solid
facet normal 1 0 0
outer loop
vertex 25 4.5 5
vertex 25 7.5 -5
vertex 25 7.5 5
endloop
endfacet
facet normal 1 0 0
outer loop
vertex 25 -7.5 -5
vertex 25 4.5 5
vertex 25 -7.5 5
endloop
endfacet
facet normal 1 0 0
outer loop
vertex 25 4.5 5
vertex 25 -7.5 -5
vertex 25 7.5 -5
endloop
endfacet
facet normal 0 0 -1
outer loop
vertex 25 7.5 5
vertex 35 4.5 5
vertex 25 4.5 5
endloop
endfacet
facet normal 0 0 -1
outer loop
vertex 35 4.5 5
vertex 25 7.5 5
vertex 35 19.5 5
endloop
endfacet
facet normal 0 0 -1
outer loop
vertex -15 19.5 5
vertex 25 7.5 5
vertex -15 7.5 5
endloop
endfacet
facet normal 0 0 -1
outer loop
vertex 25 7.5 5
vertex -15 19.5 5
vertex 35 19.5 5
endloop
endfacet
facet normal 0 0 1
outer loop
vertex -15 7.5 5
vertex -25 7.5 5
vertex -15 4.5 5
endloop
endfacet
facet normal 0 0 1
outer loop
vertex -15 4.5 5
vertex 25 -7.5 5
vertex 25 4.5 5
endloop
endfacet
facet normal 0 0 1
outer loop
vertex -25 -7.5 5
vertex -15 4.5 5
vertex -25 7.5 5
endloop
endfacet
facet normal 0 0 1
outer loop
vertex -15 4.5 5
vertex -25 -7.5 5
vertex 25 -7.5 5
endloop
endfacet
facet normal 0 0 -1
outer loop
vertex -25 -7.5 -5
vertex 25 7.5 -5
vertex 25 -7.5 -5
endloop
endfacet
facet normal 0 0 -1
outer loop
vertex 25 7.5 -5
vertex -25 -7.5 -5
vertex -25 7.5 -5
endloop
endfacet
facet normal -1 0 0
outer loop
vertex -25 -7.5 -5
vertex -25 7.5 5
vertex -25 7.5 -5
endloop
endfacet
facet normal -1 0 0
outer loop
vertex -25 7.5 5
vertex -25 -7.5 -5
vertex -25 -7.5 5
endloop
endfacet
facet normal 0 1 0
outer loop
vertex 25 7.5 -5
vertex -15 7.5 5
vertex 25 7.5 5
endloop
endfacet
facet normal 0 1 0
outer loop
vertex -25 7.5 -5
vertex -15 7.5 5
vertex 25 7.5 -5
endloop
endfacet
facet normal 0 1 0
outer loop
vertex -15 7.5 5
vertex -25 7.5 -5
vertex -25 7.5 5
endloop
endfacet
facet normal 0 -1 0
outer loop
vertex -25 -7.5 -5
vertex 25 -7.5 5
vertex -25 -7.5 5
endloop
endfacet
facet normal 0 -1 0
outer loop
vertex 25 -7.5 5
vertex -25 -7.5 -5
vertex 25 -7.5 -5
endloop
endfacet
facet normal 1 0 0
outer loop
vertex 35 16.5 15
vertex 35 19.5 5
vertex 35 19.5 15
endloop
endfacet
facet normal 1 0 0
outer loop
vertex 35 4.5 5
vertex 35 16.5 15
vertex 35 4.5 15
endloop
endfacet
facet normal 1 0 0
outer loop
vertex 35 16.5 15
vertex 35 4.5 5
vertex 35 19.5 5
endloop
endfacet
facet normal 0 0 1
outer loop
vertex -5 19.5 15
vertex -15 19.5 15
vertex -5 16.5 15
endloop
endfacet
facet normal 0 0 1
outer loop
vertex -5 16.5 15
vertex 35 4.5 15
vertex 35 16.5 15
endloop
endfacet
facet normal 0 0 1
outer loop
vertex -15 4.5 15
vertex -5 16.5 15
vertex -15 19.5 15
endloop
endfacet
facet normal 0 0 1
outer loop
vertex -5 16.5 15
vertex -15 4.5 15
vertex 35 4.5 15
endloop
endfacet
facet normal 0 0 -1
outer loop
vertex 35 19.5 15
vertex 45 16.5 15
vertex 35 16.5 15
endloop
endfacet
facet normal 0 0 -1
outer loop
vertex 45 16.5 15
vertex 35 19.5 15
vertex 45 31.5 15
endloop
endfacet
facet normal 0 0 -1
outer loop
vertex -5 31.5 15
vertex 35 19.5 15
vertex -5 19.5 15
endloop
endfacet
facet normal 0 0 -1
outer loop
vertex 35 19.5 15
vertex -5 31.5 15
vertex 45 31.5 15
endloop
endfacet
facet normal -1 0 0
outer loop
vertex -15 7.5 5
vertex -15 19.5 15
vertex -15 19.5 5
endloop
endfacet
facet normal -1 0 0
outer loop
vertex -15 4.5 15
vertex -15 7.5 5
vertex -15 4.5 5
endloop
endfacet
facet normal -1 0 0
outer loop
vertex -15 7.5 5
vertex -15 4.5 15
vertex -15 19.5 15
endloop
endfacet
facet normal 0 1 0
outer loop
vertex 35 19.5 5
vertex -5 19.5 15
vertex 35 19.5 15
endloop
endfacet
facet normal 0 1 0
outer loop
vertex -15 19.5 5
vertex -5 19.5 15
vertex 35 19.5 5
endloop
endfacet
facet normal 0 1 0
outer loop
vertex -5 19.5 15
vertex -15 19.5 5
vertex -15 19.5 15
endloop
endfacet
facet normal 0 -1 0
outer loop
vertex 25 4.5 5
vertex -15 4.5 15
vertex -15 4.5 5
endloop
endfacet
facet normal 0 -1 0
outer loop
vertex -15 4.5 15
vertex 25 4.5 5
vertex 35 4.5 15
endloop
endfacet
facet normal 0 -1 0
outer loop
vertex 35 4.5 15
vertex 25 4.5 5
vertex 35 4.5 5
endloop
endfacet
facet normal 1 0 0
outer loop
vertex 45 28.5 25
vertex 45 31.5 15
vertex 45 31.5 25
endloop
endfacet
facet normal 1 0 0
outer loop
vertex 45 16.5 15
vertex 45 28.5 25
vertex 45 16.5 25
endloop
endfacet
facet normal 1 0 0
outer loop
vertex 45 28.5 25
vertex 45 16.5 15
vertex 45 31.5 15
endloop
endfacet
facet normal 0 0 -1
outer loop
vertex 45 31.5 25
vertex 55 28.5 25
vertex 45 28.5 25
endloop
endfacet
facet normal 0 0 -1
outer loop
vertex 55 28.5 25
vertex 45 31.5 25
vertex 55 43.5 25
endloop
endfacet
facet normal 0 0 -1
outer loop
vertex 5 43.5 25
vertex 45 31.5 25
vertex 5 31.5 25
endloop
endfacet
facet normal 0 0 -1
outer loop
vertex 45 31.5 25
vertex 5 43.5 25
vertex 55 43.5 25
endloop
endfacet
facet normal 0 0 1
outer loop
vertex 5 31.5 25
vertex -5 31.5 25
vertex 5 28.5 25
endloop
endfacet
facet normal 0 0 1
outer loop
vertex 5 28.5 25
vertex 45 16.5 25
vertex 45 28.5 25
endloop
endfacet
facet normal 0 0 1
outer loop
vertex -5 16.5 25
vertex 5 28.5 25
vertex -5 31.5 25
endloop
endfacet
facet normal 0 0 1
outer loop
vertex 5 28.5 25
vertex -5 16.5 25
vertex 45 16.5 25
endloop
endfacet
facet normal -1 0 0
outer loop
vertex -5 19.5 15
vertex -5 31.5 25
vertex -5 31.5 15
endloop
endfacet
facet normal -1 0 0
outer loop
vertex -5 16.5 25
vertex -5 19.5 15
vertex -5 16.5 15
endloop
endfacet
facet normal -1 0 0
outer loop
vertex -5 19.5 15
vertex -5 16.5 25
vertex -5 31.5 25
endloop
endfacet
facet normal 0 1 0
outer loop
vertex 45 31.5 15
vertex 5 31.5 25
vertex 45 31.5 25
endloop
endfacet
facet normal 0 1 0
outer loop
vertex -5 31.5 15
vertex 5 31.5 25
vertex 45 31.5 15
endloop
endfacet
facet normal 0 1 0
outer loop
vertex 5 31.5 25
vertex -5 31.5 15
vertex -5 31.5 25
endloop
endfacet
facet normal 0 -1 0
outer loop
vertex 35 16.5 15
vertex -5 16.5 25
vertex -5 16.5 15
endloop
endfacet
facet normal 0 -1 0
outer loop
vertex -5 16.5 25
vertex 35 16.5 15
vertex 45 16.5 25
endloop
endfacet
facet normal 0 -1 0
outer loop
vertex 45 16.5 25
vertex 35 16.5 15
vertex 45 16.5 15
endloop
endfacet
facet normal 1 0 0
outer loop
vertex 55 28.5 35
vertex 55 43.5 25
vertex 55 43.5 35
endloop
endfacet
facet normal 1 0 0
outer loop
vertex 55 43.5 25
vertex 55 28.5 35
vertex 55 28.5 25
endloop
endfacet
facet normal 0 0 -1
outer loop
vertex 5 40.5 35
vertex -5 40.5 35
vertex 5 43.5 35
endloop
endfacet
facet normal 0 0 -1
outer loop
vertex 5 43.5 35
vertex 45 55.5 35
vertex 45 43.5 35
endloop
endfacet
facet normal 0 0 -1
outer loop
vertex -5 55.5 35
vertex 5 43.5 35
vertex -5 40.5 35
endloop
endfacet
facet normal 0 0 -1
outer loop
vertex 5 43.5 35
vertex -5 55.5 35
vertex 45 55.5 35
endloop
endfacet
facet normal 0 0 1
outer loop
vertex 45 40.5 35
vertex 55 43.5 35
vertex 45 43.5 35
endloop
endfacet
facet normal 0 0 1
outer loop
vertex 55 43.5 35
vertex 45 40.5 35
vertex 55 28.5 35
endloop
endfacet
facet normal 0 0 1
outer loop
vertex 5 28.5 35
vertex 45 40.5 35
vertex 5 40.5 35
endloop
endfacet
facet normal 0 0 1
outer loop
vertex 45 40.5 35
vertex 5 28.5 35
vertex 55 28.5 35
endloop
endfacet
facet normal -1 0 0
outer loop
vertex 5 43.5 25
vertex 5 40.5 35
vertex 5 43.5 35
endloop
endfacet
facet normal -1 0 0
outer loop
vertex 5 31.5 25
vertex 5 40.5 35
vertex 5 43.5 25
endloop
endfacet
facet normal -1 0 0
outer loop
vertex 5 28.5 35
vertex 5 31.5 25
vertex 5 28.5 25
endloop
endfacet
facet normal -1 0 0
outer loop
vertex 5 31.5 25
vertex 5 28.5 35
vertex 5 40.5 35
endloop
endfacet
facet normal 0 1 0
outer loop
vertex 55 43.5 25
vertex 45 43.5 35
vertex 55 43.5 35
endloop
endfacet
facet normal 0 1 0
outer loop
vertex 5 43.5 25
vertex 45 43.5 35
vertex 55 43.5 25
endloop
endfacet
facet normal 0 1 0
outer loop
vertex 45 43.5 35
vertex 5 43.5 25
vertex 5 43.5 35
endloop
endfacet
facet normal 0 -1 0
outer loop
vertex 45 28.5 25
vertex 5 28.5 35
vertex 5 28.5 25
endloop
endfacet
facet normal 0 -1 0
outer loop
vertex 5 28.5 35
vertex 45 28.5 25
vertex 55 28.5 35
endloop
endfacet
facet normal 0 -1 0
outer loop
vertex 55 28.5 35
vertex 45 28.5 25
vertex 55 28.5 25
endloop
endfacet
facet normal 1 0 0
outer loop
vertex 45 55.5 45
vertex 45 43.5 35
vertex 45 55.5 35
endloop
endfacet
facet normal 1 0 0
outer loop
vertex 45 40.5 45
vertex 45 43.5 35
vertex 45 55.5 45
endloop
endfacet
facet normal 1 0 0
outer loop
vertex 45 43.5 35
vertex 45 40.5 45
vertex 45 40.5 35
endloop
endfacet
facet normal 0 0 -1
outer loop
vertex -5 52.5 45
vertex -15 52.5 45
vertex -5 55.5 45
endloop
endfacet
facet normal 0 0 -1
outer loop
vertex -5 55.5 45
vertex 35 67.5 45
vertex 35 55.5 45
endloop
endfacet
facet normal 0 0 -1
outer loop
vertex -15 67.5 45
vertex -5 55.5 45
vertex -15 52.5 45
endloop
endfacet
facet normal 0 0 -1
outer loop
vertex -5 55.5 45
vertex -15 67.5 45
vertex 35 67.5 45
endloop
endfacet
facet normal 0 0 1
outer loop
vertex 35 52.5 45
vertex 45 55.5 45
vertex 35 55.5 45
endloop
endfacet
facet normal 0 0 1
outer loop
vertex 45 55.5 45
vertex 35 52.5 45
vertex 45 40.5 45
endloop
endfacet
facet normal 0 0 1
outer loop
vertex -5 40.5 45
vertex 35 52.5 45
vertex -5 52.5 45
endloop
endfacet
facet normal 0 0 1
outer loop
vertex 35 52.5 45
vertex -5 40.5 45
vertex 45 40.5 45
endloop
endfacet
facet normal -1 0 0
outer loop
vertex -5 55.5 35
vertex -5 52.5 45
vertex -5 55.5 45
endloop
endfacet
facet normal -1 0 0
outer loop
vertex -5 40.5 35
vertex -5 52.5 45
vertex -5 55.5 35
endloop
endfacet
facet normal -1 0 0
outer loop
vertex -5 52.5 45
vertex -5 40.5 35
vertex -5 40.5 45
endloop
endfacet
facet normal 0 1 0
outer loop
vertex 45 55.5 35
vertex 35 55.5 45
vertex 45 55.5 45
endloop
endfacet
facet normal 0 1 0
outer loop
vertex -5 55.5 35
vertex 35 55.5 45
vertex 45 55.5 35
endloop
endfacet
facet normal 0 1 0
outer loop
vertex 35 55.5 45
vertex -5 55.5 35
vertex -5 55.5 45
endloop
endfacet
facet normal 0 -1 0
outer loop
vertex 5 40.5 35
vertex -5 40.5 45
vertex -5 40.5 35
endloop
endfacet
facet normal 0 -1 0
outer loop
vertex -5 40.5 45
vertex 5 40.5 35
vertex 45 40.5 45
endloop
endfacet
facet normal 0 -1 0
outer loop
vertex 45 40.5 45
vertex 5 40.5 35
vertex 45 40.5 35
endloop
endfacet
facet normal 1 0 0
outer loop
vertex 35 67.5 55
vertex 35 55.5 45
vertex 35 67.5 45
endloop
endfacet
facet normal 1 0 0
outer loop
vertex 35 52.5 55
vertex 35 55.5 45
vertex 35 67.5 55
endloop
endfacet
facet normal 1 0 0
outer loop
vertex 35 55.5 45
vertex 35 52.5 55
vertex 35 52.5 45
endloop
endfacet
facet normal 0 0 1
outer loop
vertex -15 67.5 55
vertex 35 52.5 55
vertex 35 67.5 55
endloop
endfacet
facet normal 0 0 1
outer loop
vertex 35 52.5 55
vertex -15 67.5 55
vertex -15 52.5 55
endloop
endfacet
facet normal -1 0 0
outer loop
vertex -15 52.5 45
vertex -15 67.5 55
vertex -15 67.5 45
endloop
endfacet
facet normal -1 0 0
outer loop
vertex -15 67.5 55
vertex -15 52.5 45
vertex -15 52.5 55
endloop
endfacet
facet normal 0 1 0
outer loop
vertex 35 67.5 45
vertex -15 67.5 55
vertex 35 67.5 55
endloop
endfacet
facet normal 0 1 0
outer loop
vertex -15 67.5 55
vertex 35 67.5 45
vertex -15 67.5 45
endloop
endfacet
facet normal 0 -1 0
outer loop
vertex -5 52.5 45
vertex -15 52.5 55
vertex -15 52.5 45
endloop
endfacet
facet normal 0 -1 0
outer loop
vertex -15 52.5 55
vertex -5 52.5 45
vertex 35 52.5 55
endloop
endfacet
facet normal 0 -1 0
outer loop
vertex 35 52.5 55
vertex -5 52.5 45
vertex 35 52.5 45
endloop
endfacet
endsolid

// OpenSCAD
for(i = [ [ 0,  0,  0],
           [10, 12, 10],
           [20, 24, 20],
           [30, 36, 30],
           [20, 48, 40],
           [10, 60, 50] ])
{
    translate(i)
    cube([50, 15, 10], center = true);
}
